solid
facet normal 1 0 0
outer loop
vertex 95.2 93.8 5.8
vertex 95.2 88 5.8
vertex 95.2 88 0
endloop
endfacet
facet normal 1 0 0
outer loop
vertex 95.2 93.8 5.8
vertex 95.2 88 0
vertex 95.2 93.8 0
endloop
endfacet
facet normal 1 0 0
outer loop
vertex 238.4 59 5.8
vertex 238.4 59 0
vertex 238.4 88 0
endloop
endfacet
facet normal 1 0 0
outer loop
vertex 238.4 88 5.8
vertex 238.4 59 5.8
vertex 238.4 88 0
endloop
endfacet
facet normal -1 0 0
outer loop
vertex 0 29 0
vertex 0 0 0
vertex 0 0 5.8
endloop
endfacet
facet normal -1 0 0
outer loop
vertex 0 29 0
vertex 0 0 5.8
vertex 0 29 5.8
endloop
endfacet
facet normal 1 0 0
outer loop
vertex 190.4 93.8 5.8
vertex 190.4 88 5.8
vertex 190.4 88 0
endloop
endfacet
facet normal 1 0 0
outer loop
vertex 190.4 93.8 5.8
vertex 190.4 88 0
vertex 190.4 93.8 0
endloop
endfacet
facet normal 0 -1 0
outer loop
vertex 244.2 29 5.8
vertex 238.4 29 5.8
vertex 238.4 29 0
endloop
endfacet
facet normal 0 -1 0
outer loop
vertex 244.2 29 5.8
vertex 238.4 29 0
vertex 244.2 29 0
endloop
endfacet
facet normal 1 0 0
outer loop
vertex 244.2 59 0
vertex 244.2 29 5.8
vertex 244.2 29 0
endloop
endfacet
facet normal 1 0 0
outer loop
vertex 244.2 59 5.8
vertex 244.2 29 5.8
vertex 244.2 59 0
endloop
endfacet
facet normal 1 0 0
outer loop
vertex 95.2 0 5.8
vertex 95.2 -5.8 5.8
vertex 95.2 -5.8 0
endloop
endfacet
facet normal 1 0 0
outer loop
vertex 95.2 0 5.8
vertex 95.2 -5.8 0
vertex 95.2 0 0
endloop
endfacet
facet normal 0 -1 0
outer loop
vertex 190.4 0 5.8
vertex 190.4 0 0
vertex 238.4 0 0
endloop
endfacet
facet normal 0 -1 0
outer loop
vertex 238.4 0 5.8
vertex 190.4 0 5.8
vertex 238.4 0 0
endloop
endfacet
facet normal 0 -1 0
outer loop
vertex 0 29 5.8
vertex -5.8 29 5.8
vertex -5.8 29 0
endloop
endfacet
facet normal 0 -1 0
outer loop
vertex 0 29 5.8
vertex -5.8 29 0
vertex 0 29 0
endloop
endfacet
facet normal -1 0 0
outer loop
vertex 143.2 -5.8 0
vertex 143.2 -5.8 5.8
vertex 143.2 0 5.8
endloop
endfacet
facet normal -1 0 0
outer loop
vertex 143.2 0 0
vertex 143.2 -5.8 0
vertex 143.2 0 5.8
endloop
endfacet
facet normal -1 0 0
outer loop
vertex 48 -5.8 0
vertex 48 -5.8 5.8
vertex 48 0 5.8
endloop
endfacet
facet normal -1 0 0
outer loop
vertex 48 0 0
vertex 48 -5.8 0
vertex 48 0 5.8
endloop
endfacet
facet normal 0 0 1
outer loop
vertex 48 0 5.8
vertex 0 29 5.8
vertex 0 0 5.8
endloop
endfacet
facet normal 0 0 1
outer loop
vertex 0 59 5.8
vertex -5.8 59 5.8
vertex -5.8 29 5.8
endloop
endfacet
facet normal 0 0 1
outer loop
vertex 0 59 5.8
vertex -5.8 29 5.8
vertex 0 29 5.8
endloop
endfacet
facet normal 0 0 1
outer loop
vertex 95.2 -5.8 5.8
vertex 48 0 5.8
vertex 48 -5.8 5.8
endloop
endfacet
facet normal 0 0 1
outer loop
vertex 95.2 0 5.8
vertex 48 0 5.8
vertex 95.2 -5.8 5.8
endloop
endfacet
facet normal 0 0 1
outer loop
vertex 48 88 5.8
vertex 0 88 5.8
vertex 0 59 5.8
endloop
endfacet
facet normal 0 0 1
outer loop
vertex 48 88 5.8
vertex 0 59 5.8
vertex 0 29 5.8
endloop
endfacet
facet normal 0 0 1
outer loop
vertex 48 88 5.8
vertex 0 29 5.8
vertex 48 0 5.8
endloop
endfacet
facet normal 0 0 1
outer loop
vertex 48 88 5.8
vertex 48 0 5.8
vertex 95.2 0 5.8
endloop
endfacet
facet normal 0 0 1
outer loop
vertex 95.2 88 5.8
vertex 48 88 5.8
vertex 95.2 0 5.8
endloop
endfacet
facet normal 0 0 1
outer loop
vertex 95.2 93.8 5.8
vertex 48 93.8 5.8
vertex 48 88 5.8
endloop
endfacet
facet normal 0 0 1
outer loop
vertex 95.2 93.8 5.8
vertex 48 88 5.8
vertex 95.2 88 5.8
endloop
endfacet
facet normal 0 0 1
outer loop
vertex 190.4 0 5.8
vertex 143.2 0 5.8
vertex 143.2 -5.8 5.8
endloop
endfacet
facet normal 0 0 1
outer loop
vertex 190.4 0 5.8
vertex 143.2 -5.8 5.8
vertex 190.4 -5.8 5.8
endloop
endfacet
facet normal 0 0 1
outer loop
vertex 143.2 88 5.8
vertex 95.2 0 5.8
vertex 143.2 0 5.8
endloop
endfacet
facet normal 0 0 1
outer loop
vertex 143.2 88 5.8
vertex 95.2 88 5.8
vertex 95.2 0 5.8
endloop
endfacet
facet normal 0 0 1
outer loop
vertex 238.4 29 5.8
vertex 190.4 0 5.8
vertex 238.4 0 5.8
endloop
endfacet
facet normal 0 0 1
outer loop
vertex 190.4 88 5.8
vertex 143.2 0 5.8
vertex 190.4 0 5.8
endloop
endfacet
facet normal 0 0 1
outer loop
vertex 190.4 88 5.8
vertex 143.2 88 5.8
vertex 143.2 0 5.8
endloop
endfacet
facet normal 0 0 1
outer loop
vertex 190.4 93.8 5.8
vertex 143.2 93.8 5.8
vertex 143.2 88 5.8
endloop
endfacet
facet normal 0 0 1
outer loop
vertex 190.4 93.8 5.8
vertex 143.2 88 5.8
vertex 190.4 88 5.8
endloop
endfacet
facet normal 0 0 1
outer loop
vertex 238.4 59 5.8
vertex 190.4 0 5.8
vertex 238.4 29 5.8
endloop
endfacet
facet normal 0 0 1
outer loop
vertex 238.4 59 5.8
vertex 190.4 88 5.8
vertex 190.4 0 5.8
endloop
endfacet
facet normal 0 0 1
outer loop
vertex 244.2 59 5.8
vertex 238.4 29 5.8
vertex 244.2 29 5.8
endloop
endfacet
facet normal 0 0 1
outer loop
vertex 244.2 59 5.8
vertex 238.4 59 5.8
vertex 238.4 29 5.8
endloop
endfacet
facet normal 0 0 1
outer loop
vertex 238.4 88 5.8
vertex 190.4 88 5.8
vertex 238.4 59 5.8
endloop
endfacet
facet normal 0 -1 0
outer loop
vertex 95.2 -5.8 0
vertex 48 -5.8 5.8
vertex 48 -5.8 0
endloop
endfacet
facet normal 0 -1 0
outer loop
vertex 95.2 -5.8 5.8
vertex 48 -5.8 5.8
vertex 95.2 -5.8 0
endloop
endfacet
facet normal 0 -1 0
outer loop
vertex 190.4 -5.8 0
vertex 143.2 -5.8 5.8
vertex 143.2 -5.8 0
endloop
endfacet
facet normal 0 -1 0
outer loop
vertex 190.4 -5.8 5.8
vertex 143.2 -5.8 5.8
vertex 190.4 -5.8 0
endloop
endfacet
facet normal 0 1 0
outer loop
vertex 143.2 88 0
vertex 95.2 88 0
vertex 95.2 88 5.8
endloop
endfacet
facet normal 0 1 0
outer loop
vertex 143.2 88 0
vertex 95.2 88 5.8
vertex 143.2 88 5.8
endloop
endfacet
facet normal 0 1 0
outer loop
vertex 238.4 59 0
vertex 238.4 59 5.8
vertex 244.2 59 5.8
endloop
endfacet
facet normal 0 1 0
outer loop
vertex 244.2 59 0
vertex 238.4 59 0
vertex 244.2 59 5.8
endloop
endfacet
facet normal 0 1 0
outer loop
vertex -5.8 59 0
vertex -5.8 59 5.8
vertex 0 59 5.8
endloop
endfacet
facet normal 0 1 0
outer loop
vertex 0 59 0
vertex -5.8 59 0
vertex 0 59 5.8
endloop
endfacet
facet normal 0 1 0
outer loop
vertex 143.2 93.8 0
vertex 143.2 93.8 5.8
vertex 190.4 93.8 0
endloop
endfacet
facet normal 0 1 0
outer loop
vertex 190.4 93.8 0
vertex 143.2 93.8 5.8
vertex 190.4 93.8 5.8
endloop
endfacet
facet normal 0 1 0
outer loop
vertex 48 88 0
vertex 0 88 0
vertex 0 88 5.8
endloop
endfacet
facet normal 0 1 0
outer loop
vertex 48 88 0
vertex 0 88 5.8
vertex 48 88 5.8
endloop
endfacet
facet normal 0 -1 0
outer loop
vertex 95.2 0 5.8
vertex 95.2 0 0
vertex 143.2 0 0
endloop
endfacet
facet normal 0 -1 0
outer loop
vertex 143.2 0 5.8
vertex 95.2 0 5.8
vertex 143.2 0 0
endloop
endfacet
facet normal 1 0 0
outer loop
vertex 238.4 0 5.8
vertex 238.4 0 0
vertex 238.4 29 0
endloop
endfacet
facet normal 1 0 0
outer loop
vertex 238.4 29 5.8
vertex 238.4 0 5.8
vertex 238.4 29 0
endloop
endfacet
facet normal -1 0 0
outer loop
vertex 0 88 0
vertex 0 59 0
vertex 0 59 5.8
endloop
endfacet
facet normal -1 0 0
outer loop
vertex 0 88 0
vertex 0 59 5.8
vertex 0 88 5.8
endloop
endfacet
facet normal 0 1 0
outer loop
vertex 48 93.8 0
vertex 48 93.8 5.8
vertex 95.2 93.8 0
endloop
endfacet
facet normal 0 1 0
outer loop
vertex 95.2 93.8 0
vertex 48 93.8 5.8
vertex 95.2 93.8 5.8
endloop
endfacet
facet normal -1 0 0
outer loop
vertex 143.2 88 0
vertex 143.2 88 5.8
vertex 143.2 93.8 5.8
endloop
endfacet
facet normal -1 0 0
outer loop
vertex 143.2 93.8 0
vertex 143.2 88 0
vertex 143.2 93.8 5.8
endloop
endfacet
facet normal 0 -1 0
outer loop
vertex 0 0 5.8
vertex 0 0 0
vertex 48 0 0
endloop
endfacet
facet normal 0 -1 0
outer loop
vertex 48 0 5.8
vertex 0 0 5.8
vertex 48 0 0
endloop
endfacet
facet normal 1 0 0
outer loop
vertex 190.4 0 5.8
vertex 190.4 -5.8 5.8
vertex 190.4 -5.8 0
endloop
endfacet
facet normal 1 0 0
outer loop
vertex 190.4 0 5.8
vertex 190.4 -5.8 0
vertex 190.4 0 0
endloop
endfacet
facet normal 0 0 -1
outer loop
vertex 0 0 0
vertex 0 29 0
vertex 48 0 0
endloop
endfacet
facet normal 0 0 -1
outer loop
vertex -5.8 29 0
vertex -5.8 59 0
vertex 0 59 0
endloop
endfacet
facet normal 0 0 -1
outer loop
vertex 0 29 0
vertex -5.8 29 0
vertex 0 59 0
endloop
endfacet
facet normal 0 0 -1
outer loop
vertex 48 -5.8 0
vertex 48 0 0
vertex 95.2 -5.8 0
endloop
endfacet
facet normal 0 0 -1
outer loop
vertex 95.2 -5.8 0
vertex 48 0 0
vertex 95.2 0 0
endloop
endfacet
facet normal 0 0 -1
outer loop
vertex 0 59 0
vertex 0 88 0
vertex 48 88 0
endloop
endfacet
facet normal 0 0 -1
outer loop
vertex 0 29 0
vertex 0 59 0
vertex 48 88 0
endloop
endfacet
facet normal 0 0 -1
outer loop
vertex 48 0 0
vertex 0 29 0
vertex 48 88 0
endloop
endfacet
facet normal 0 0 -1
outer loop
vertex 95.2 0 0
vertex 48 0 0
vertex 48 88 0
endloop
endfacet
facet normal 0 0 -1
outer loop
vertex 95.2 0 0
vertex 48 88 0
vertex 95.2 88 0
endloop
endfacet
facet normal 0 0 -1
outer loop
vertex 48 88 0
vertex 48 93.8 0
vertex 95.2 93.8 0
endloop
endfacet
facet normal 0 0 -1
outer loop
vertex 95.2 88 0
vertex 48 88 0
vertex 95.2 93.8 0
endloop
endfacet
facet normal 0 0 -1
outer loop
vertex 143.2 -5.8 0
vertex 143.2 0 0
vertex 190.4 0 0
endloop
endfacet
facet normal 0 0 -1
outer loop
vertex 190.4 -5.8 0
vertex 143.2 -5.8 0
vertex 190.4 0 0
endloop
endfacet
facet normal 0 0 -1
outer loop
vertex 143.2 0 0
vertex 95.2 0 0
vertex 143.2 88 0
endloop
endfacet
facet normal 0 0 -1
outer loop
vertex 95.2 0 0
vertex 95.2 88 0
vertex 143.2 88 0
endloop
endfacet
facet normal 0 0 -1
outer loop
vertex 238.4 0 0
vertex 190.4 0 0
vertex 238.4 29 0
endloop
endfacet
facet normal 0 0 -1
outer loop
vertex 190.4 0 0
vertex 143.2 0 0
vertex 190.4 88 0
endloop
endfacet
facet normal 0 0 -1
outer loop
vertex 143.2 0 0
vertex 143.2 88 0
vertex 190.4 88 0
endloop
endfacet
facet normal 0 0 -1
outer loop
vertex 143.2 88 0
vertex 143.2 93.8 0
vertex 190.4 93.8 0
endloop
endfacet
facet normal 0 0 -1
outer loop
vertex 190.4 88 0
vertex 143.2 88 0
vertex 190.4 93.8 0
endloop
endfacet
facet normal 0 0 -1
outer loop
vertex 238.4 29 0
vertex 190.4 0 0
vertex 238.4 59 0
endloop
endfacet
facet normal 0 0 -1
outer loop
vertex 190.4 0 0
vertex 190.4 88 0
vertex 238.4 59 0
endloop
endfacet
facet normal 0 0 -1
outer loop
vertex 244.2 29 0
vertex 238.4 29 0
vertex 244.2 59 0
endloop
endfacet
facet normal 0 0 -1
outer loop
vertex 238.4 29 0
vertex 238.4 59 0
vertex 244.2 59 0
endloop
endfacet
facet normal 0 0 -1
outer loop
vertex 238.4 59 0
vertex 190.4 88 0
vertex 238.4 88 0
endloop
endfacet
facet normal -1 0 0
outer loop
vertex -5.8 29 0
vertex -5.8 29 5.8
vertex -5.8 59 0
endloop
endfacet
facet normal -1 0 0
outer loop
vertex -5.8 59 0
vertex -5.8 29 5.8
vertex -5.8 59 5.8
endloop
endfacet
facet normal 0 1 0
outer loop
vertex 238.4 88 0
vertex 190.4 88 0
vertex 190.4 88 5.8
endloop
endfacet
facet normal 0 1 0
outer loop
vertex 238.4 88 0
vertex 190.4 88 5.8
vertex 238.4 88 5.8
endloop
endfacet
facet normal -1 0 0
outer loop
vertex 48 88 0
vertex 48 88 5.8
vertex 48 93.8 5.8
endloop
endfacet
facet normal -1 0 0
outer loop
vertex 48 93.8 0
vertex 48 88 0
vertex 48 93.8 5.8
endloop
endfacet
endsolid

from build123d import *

# Parameters (mm, degrees)
SKETCH_1_W      = 238.4
SKETCH_1_H      = 88
EXTRUDE_1_DEPTH = 5.8
SKETCH_2_W      = 5.8
SKETCH_2_H      = 30
SKETCH_2_W_2    = 47.2
SKETCH_2_H_2    = 5.8
EXTRUDE_2_DEPTH = 5.8


with BuildPart() as part:
    # Эскиз1 → Бобышка-Вытянуть1 (new body)
    with BuildSketch(Plane.XY):
        with Locations((119.2, 44)):
            Rectangle(SKETCH_1_W, SKETCH_1_H)
    extrude(amount=EXTRUDE_1_DEPTH)

    # Эскиз2 → Бобышка-Вытянуть2 (add)
    with BuildSketch(Plane.XY.offset(5.8)):
        with Locations((-2.9, 44)):
            Rectangle(SKETCH_2_W, SKETCH_2_H)
        with Locations((241.3, 44)):
            Rectangle(SKETCH_2_W, SKETCH_2_H)
        with Locations((71.6, 90.9)):
            Rectangle(SKETCH_2_W_2, SKETCH_2_H_2)
        with Locations((166.8, 90.9)):
            Rectangle(SKETCH_2_W_2, SKETCH_2_H_2)
        with Locations((71.6, -2.9)):
            Rectangle(SKETCH_2_W_2, SKETCH_2_H_2)
        with Locations((166.8, -2.9)):
            Rectangle(SKETCH_2_W_2, SKETCH_2_H_2)
    extrude(amount=-EXTRUDE_2_DEPTH)


solid = part.part
